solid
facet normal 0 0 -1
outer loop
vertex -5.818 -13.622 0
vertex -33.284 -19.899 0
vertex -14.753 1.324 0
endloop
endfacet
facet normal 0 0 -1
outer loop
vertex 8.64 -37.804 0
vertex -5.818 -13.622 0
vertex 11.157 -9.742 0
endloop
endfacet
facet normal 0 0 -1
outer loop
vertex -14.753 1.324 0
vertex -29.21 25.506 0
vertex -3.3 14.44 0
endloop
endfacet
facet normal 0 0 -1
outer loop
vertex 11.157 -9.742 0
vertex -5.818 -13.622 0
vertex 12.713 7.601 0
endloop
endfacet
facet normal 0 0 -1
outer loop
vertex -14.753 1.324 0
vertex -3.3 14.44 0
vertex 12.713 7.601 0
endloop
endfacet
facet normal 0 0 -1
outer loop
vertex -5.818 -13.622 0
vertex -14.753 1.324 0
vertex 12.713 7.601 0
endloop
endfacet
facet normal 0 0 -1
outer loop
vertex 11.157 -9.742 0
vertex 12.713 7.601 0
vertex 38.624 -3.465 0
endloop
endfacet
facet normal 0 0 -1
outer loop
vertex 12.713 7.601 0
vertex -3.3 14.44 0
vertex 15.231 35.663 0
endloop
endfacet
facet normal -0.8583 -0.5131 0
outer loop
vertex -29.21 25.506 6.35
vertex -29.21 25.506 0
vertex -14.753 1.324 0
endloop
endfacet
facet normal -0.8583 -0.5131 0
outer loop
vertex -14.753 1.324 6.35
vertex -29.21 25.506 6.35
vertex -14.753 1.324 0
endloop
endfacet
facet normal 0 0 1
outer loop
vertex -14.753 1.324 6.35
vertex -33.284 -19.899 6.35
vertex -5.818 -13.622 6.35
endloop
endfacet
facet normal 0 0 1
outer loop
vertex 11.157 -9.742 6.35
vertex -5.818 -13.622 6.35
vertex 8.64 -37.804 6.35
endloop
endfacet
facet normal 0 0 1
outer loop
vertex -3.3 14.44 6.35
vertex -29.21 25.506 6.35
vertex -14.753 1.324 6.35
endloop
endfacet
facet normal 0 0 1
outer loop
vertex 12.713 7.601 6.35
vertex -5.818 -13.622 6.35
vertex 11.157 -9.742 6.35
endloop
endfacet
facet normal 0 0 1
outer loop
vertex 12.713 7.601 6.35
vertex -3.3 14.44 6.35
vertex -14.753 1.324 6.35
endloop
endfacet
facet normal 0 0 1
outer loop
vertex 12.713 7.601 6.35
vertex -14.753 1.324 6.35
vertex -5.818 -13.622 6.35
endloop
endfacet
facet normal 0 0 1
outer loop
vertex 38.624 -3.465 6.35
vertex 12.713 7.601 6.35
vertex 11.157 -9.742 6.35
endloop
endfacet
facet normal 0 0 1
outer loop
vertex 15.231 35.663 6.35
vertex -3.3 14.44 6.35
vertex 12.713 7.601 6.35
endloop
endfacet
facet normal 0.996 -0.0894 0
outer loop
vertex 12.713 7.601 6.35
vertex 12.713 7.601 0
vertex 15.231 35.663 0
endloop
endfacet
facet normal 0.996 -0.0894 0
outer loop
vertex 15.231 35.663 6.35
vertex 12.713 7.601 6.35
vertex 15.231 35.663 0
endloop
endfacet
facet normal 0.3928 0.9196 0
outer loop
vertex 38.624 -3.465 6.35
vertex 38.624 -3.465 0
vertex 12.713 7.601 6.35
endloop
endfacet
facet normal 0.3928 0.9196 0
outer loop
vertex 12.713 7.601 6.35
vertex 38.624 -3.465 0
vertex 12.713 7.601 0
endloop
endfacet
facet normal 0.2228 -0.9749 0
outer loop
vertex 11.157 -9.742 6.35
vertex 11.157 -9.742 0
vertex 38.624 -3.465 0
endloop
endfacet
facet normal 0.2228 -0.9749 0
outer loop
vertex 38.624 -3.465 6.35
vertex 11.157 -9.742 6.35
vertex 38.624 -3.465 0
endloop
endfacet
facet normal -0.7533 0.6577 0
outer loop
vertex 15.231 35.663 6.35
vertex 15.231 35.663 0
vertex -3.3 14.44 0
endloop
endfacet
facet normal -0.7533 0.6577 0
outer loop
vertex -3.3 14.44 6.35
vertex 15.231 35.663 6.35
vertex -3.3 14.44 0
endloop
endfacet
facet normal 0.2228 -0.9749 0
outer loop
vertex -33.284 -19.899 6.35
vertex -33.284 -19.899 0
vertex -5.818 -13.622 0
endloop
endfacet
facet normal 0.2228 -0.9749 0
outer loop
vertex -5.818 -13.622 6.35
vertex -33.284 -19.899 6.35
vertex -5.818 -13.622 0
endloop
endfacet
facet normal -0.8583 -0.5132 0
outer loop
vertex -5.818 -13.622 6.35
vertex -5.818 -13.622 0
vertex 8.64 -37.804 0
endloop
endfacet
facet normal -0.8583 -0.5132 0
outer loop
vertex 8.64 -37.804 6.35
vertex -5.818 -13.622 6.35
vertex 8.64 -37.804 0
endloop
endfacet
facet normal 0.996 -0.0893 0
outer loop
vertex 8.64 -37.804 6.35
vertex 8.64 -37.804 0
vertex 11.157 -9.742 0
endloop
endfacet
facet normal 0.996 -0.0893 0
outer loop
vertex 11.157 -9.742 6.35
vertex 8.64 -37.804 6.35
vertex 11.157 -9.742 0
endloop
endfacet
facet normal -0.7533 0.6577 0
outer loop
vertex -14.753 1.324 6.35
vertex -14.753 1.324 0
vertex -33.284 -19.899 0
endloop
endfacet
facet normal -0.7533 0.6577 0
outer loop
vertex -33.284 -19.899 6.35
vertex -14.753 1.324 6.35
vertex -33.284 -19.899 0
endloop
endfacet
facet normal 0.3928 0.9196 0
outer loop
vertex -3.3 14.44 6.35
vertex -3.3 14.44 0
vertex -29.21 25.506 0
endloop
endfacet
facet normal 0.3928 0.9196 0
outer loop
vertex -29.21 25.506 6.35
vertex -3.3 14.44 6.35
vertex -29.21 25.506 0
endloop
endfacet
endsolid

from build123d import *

# Parameters (mm, degrees)
F1_DEPTH = 6.35


with BuildPart() as f1:
    # F0 (on Top) → F1 (new body)
    with BuildSketch(Plane.XY):
        Polygon((-14.7529365335, 1.3235569542), (-5.8176855718, -13.6218748328), (11.1574091143, -9.7423385914), (12.7133436308, 7.6007784534), (-3.3001306398, 14.4398780166), align=None)
        Polygon((12.7133436308, 7.6007784534), (11.1574091143, -9.7423385914), (38.6236892786, -3.4651170922), align=None)
        Polygon((-5.8176855718, -13.6218748328), (8.6398541823, -37.8040914407), (11.1574091143, -9.7423385914), align=None)
        Polygon((-33.2839657361, -19.899096332), (-5.8176855718, -13.6218748328), (-14.7529365335, 1.3235569542), align=None)
        Polygon((-29.2104762876, 25.5057735621), (-14.7529365335, 1.3235569542), (-3.3001306398, 14.4398780166), align=None)
        Polygon((-3.3001306398, 14.4398780166), (12.7133436308, 7.6007784534), (15.2308985628, 35.6625313028), align=None)
    extrude(amount=F1_DEPTH)


solid = f1.part
